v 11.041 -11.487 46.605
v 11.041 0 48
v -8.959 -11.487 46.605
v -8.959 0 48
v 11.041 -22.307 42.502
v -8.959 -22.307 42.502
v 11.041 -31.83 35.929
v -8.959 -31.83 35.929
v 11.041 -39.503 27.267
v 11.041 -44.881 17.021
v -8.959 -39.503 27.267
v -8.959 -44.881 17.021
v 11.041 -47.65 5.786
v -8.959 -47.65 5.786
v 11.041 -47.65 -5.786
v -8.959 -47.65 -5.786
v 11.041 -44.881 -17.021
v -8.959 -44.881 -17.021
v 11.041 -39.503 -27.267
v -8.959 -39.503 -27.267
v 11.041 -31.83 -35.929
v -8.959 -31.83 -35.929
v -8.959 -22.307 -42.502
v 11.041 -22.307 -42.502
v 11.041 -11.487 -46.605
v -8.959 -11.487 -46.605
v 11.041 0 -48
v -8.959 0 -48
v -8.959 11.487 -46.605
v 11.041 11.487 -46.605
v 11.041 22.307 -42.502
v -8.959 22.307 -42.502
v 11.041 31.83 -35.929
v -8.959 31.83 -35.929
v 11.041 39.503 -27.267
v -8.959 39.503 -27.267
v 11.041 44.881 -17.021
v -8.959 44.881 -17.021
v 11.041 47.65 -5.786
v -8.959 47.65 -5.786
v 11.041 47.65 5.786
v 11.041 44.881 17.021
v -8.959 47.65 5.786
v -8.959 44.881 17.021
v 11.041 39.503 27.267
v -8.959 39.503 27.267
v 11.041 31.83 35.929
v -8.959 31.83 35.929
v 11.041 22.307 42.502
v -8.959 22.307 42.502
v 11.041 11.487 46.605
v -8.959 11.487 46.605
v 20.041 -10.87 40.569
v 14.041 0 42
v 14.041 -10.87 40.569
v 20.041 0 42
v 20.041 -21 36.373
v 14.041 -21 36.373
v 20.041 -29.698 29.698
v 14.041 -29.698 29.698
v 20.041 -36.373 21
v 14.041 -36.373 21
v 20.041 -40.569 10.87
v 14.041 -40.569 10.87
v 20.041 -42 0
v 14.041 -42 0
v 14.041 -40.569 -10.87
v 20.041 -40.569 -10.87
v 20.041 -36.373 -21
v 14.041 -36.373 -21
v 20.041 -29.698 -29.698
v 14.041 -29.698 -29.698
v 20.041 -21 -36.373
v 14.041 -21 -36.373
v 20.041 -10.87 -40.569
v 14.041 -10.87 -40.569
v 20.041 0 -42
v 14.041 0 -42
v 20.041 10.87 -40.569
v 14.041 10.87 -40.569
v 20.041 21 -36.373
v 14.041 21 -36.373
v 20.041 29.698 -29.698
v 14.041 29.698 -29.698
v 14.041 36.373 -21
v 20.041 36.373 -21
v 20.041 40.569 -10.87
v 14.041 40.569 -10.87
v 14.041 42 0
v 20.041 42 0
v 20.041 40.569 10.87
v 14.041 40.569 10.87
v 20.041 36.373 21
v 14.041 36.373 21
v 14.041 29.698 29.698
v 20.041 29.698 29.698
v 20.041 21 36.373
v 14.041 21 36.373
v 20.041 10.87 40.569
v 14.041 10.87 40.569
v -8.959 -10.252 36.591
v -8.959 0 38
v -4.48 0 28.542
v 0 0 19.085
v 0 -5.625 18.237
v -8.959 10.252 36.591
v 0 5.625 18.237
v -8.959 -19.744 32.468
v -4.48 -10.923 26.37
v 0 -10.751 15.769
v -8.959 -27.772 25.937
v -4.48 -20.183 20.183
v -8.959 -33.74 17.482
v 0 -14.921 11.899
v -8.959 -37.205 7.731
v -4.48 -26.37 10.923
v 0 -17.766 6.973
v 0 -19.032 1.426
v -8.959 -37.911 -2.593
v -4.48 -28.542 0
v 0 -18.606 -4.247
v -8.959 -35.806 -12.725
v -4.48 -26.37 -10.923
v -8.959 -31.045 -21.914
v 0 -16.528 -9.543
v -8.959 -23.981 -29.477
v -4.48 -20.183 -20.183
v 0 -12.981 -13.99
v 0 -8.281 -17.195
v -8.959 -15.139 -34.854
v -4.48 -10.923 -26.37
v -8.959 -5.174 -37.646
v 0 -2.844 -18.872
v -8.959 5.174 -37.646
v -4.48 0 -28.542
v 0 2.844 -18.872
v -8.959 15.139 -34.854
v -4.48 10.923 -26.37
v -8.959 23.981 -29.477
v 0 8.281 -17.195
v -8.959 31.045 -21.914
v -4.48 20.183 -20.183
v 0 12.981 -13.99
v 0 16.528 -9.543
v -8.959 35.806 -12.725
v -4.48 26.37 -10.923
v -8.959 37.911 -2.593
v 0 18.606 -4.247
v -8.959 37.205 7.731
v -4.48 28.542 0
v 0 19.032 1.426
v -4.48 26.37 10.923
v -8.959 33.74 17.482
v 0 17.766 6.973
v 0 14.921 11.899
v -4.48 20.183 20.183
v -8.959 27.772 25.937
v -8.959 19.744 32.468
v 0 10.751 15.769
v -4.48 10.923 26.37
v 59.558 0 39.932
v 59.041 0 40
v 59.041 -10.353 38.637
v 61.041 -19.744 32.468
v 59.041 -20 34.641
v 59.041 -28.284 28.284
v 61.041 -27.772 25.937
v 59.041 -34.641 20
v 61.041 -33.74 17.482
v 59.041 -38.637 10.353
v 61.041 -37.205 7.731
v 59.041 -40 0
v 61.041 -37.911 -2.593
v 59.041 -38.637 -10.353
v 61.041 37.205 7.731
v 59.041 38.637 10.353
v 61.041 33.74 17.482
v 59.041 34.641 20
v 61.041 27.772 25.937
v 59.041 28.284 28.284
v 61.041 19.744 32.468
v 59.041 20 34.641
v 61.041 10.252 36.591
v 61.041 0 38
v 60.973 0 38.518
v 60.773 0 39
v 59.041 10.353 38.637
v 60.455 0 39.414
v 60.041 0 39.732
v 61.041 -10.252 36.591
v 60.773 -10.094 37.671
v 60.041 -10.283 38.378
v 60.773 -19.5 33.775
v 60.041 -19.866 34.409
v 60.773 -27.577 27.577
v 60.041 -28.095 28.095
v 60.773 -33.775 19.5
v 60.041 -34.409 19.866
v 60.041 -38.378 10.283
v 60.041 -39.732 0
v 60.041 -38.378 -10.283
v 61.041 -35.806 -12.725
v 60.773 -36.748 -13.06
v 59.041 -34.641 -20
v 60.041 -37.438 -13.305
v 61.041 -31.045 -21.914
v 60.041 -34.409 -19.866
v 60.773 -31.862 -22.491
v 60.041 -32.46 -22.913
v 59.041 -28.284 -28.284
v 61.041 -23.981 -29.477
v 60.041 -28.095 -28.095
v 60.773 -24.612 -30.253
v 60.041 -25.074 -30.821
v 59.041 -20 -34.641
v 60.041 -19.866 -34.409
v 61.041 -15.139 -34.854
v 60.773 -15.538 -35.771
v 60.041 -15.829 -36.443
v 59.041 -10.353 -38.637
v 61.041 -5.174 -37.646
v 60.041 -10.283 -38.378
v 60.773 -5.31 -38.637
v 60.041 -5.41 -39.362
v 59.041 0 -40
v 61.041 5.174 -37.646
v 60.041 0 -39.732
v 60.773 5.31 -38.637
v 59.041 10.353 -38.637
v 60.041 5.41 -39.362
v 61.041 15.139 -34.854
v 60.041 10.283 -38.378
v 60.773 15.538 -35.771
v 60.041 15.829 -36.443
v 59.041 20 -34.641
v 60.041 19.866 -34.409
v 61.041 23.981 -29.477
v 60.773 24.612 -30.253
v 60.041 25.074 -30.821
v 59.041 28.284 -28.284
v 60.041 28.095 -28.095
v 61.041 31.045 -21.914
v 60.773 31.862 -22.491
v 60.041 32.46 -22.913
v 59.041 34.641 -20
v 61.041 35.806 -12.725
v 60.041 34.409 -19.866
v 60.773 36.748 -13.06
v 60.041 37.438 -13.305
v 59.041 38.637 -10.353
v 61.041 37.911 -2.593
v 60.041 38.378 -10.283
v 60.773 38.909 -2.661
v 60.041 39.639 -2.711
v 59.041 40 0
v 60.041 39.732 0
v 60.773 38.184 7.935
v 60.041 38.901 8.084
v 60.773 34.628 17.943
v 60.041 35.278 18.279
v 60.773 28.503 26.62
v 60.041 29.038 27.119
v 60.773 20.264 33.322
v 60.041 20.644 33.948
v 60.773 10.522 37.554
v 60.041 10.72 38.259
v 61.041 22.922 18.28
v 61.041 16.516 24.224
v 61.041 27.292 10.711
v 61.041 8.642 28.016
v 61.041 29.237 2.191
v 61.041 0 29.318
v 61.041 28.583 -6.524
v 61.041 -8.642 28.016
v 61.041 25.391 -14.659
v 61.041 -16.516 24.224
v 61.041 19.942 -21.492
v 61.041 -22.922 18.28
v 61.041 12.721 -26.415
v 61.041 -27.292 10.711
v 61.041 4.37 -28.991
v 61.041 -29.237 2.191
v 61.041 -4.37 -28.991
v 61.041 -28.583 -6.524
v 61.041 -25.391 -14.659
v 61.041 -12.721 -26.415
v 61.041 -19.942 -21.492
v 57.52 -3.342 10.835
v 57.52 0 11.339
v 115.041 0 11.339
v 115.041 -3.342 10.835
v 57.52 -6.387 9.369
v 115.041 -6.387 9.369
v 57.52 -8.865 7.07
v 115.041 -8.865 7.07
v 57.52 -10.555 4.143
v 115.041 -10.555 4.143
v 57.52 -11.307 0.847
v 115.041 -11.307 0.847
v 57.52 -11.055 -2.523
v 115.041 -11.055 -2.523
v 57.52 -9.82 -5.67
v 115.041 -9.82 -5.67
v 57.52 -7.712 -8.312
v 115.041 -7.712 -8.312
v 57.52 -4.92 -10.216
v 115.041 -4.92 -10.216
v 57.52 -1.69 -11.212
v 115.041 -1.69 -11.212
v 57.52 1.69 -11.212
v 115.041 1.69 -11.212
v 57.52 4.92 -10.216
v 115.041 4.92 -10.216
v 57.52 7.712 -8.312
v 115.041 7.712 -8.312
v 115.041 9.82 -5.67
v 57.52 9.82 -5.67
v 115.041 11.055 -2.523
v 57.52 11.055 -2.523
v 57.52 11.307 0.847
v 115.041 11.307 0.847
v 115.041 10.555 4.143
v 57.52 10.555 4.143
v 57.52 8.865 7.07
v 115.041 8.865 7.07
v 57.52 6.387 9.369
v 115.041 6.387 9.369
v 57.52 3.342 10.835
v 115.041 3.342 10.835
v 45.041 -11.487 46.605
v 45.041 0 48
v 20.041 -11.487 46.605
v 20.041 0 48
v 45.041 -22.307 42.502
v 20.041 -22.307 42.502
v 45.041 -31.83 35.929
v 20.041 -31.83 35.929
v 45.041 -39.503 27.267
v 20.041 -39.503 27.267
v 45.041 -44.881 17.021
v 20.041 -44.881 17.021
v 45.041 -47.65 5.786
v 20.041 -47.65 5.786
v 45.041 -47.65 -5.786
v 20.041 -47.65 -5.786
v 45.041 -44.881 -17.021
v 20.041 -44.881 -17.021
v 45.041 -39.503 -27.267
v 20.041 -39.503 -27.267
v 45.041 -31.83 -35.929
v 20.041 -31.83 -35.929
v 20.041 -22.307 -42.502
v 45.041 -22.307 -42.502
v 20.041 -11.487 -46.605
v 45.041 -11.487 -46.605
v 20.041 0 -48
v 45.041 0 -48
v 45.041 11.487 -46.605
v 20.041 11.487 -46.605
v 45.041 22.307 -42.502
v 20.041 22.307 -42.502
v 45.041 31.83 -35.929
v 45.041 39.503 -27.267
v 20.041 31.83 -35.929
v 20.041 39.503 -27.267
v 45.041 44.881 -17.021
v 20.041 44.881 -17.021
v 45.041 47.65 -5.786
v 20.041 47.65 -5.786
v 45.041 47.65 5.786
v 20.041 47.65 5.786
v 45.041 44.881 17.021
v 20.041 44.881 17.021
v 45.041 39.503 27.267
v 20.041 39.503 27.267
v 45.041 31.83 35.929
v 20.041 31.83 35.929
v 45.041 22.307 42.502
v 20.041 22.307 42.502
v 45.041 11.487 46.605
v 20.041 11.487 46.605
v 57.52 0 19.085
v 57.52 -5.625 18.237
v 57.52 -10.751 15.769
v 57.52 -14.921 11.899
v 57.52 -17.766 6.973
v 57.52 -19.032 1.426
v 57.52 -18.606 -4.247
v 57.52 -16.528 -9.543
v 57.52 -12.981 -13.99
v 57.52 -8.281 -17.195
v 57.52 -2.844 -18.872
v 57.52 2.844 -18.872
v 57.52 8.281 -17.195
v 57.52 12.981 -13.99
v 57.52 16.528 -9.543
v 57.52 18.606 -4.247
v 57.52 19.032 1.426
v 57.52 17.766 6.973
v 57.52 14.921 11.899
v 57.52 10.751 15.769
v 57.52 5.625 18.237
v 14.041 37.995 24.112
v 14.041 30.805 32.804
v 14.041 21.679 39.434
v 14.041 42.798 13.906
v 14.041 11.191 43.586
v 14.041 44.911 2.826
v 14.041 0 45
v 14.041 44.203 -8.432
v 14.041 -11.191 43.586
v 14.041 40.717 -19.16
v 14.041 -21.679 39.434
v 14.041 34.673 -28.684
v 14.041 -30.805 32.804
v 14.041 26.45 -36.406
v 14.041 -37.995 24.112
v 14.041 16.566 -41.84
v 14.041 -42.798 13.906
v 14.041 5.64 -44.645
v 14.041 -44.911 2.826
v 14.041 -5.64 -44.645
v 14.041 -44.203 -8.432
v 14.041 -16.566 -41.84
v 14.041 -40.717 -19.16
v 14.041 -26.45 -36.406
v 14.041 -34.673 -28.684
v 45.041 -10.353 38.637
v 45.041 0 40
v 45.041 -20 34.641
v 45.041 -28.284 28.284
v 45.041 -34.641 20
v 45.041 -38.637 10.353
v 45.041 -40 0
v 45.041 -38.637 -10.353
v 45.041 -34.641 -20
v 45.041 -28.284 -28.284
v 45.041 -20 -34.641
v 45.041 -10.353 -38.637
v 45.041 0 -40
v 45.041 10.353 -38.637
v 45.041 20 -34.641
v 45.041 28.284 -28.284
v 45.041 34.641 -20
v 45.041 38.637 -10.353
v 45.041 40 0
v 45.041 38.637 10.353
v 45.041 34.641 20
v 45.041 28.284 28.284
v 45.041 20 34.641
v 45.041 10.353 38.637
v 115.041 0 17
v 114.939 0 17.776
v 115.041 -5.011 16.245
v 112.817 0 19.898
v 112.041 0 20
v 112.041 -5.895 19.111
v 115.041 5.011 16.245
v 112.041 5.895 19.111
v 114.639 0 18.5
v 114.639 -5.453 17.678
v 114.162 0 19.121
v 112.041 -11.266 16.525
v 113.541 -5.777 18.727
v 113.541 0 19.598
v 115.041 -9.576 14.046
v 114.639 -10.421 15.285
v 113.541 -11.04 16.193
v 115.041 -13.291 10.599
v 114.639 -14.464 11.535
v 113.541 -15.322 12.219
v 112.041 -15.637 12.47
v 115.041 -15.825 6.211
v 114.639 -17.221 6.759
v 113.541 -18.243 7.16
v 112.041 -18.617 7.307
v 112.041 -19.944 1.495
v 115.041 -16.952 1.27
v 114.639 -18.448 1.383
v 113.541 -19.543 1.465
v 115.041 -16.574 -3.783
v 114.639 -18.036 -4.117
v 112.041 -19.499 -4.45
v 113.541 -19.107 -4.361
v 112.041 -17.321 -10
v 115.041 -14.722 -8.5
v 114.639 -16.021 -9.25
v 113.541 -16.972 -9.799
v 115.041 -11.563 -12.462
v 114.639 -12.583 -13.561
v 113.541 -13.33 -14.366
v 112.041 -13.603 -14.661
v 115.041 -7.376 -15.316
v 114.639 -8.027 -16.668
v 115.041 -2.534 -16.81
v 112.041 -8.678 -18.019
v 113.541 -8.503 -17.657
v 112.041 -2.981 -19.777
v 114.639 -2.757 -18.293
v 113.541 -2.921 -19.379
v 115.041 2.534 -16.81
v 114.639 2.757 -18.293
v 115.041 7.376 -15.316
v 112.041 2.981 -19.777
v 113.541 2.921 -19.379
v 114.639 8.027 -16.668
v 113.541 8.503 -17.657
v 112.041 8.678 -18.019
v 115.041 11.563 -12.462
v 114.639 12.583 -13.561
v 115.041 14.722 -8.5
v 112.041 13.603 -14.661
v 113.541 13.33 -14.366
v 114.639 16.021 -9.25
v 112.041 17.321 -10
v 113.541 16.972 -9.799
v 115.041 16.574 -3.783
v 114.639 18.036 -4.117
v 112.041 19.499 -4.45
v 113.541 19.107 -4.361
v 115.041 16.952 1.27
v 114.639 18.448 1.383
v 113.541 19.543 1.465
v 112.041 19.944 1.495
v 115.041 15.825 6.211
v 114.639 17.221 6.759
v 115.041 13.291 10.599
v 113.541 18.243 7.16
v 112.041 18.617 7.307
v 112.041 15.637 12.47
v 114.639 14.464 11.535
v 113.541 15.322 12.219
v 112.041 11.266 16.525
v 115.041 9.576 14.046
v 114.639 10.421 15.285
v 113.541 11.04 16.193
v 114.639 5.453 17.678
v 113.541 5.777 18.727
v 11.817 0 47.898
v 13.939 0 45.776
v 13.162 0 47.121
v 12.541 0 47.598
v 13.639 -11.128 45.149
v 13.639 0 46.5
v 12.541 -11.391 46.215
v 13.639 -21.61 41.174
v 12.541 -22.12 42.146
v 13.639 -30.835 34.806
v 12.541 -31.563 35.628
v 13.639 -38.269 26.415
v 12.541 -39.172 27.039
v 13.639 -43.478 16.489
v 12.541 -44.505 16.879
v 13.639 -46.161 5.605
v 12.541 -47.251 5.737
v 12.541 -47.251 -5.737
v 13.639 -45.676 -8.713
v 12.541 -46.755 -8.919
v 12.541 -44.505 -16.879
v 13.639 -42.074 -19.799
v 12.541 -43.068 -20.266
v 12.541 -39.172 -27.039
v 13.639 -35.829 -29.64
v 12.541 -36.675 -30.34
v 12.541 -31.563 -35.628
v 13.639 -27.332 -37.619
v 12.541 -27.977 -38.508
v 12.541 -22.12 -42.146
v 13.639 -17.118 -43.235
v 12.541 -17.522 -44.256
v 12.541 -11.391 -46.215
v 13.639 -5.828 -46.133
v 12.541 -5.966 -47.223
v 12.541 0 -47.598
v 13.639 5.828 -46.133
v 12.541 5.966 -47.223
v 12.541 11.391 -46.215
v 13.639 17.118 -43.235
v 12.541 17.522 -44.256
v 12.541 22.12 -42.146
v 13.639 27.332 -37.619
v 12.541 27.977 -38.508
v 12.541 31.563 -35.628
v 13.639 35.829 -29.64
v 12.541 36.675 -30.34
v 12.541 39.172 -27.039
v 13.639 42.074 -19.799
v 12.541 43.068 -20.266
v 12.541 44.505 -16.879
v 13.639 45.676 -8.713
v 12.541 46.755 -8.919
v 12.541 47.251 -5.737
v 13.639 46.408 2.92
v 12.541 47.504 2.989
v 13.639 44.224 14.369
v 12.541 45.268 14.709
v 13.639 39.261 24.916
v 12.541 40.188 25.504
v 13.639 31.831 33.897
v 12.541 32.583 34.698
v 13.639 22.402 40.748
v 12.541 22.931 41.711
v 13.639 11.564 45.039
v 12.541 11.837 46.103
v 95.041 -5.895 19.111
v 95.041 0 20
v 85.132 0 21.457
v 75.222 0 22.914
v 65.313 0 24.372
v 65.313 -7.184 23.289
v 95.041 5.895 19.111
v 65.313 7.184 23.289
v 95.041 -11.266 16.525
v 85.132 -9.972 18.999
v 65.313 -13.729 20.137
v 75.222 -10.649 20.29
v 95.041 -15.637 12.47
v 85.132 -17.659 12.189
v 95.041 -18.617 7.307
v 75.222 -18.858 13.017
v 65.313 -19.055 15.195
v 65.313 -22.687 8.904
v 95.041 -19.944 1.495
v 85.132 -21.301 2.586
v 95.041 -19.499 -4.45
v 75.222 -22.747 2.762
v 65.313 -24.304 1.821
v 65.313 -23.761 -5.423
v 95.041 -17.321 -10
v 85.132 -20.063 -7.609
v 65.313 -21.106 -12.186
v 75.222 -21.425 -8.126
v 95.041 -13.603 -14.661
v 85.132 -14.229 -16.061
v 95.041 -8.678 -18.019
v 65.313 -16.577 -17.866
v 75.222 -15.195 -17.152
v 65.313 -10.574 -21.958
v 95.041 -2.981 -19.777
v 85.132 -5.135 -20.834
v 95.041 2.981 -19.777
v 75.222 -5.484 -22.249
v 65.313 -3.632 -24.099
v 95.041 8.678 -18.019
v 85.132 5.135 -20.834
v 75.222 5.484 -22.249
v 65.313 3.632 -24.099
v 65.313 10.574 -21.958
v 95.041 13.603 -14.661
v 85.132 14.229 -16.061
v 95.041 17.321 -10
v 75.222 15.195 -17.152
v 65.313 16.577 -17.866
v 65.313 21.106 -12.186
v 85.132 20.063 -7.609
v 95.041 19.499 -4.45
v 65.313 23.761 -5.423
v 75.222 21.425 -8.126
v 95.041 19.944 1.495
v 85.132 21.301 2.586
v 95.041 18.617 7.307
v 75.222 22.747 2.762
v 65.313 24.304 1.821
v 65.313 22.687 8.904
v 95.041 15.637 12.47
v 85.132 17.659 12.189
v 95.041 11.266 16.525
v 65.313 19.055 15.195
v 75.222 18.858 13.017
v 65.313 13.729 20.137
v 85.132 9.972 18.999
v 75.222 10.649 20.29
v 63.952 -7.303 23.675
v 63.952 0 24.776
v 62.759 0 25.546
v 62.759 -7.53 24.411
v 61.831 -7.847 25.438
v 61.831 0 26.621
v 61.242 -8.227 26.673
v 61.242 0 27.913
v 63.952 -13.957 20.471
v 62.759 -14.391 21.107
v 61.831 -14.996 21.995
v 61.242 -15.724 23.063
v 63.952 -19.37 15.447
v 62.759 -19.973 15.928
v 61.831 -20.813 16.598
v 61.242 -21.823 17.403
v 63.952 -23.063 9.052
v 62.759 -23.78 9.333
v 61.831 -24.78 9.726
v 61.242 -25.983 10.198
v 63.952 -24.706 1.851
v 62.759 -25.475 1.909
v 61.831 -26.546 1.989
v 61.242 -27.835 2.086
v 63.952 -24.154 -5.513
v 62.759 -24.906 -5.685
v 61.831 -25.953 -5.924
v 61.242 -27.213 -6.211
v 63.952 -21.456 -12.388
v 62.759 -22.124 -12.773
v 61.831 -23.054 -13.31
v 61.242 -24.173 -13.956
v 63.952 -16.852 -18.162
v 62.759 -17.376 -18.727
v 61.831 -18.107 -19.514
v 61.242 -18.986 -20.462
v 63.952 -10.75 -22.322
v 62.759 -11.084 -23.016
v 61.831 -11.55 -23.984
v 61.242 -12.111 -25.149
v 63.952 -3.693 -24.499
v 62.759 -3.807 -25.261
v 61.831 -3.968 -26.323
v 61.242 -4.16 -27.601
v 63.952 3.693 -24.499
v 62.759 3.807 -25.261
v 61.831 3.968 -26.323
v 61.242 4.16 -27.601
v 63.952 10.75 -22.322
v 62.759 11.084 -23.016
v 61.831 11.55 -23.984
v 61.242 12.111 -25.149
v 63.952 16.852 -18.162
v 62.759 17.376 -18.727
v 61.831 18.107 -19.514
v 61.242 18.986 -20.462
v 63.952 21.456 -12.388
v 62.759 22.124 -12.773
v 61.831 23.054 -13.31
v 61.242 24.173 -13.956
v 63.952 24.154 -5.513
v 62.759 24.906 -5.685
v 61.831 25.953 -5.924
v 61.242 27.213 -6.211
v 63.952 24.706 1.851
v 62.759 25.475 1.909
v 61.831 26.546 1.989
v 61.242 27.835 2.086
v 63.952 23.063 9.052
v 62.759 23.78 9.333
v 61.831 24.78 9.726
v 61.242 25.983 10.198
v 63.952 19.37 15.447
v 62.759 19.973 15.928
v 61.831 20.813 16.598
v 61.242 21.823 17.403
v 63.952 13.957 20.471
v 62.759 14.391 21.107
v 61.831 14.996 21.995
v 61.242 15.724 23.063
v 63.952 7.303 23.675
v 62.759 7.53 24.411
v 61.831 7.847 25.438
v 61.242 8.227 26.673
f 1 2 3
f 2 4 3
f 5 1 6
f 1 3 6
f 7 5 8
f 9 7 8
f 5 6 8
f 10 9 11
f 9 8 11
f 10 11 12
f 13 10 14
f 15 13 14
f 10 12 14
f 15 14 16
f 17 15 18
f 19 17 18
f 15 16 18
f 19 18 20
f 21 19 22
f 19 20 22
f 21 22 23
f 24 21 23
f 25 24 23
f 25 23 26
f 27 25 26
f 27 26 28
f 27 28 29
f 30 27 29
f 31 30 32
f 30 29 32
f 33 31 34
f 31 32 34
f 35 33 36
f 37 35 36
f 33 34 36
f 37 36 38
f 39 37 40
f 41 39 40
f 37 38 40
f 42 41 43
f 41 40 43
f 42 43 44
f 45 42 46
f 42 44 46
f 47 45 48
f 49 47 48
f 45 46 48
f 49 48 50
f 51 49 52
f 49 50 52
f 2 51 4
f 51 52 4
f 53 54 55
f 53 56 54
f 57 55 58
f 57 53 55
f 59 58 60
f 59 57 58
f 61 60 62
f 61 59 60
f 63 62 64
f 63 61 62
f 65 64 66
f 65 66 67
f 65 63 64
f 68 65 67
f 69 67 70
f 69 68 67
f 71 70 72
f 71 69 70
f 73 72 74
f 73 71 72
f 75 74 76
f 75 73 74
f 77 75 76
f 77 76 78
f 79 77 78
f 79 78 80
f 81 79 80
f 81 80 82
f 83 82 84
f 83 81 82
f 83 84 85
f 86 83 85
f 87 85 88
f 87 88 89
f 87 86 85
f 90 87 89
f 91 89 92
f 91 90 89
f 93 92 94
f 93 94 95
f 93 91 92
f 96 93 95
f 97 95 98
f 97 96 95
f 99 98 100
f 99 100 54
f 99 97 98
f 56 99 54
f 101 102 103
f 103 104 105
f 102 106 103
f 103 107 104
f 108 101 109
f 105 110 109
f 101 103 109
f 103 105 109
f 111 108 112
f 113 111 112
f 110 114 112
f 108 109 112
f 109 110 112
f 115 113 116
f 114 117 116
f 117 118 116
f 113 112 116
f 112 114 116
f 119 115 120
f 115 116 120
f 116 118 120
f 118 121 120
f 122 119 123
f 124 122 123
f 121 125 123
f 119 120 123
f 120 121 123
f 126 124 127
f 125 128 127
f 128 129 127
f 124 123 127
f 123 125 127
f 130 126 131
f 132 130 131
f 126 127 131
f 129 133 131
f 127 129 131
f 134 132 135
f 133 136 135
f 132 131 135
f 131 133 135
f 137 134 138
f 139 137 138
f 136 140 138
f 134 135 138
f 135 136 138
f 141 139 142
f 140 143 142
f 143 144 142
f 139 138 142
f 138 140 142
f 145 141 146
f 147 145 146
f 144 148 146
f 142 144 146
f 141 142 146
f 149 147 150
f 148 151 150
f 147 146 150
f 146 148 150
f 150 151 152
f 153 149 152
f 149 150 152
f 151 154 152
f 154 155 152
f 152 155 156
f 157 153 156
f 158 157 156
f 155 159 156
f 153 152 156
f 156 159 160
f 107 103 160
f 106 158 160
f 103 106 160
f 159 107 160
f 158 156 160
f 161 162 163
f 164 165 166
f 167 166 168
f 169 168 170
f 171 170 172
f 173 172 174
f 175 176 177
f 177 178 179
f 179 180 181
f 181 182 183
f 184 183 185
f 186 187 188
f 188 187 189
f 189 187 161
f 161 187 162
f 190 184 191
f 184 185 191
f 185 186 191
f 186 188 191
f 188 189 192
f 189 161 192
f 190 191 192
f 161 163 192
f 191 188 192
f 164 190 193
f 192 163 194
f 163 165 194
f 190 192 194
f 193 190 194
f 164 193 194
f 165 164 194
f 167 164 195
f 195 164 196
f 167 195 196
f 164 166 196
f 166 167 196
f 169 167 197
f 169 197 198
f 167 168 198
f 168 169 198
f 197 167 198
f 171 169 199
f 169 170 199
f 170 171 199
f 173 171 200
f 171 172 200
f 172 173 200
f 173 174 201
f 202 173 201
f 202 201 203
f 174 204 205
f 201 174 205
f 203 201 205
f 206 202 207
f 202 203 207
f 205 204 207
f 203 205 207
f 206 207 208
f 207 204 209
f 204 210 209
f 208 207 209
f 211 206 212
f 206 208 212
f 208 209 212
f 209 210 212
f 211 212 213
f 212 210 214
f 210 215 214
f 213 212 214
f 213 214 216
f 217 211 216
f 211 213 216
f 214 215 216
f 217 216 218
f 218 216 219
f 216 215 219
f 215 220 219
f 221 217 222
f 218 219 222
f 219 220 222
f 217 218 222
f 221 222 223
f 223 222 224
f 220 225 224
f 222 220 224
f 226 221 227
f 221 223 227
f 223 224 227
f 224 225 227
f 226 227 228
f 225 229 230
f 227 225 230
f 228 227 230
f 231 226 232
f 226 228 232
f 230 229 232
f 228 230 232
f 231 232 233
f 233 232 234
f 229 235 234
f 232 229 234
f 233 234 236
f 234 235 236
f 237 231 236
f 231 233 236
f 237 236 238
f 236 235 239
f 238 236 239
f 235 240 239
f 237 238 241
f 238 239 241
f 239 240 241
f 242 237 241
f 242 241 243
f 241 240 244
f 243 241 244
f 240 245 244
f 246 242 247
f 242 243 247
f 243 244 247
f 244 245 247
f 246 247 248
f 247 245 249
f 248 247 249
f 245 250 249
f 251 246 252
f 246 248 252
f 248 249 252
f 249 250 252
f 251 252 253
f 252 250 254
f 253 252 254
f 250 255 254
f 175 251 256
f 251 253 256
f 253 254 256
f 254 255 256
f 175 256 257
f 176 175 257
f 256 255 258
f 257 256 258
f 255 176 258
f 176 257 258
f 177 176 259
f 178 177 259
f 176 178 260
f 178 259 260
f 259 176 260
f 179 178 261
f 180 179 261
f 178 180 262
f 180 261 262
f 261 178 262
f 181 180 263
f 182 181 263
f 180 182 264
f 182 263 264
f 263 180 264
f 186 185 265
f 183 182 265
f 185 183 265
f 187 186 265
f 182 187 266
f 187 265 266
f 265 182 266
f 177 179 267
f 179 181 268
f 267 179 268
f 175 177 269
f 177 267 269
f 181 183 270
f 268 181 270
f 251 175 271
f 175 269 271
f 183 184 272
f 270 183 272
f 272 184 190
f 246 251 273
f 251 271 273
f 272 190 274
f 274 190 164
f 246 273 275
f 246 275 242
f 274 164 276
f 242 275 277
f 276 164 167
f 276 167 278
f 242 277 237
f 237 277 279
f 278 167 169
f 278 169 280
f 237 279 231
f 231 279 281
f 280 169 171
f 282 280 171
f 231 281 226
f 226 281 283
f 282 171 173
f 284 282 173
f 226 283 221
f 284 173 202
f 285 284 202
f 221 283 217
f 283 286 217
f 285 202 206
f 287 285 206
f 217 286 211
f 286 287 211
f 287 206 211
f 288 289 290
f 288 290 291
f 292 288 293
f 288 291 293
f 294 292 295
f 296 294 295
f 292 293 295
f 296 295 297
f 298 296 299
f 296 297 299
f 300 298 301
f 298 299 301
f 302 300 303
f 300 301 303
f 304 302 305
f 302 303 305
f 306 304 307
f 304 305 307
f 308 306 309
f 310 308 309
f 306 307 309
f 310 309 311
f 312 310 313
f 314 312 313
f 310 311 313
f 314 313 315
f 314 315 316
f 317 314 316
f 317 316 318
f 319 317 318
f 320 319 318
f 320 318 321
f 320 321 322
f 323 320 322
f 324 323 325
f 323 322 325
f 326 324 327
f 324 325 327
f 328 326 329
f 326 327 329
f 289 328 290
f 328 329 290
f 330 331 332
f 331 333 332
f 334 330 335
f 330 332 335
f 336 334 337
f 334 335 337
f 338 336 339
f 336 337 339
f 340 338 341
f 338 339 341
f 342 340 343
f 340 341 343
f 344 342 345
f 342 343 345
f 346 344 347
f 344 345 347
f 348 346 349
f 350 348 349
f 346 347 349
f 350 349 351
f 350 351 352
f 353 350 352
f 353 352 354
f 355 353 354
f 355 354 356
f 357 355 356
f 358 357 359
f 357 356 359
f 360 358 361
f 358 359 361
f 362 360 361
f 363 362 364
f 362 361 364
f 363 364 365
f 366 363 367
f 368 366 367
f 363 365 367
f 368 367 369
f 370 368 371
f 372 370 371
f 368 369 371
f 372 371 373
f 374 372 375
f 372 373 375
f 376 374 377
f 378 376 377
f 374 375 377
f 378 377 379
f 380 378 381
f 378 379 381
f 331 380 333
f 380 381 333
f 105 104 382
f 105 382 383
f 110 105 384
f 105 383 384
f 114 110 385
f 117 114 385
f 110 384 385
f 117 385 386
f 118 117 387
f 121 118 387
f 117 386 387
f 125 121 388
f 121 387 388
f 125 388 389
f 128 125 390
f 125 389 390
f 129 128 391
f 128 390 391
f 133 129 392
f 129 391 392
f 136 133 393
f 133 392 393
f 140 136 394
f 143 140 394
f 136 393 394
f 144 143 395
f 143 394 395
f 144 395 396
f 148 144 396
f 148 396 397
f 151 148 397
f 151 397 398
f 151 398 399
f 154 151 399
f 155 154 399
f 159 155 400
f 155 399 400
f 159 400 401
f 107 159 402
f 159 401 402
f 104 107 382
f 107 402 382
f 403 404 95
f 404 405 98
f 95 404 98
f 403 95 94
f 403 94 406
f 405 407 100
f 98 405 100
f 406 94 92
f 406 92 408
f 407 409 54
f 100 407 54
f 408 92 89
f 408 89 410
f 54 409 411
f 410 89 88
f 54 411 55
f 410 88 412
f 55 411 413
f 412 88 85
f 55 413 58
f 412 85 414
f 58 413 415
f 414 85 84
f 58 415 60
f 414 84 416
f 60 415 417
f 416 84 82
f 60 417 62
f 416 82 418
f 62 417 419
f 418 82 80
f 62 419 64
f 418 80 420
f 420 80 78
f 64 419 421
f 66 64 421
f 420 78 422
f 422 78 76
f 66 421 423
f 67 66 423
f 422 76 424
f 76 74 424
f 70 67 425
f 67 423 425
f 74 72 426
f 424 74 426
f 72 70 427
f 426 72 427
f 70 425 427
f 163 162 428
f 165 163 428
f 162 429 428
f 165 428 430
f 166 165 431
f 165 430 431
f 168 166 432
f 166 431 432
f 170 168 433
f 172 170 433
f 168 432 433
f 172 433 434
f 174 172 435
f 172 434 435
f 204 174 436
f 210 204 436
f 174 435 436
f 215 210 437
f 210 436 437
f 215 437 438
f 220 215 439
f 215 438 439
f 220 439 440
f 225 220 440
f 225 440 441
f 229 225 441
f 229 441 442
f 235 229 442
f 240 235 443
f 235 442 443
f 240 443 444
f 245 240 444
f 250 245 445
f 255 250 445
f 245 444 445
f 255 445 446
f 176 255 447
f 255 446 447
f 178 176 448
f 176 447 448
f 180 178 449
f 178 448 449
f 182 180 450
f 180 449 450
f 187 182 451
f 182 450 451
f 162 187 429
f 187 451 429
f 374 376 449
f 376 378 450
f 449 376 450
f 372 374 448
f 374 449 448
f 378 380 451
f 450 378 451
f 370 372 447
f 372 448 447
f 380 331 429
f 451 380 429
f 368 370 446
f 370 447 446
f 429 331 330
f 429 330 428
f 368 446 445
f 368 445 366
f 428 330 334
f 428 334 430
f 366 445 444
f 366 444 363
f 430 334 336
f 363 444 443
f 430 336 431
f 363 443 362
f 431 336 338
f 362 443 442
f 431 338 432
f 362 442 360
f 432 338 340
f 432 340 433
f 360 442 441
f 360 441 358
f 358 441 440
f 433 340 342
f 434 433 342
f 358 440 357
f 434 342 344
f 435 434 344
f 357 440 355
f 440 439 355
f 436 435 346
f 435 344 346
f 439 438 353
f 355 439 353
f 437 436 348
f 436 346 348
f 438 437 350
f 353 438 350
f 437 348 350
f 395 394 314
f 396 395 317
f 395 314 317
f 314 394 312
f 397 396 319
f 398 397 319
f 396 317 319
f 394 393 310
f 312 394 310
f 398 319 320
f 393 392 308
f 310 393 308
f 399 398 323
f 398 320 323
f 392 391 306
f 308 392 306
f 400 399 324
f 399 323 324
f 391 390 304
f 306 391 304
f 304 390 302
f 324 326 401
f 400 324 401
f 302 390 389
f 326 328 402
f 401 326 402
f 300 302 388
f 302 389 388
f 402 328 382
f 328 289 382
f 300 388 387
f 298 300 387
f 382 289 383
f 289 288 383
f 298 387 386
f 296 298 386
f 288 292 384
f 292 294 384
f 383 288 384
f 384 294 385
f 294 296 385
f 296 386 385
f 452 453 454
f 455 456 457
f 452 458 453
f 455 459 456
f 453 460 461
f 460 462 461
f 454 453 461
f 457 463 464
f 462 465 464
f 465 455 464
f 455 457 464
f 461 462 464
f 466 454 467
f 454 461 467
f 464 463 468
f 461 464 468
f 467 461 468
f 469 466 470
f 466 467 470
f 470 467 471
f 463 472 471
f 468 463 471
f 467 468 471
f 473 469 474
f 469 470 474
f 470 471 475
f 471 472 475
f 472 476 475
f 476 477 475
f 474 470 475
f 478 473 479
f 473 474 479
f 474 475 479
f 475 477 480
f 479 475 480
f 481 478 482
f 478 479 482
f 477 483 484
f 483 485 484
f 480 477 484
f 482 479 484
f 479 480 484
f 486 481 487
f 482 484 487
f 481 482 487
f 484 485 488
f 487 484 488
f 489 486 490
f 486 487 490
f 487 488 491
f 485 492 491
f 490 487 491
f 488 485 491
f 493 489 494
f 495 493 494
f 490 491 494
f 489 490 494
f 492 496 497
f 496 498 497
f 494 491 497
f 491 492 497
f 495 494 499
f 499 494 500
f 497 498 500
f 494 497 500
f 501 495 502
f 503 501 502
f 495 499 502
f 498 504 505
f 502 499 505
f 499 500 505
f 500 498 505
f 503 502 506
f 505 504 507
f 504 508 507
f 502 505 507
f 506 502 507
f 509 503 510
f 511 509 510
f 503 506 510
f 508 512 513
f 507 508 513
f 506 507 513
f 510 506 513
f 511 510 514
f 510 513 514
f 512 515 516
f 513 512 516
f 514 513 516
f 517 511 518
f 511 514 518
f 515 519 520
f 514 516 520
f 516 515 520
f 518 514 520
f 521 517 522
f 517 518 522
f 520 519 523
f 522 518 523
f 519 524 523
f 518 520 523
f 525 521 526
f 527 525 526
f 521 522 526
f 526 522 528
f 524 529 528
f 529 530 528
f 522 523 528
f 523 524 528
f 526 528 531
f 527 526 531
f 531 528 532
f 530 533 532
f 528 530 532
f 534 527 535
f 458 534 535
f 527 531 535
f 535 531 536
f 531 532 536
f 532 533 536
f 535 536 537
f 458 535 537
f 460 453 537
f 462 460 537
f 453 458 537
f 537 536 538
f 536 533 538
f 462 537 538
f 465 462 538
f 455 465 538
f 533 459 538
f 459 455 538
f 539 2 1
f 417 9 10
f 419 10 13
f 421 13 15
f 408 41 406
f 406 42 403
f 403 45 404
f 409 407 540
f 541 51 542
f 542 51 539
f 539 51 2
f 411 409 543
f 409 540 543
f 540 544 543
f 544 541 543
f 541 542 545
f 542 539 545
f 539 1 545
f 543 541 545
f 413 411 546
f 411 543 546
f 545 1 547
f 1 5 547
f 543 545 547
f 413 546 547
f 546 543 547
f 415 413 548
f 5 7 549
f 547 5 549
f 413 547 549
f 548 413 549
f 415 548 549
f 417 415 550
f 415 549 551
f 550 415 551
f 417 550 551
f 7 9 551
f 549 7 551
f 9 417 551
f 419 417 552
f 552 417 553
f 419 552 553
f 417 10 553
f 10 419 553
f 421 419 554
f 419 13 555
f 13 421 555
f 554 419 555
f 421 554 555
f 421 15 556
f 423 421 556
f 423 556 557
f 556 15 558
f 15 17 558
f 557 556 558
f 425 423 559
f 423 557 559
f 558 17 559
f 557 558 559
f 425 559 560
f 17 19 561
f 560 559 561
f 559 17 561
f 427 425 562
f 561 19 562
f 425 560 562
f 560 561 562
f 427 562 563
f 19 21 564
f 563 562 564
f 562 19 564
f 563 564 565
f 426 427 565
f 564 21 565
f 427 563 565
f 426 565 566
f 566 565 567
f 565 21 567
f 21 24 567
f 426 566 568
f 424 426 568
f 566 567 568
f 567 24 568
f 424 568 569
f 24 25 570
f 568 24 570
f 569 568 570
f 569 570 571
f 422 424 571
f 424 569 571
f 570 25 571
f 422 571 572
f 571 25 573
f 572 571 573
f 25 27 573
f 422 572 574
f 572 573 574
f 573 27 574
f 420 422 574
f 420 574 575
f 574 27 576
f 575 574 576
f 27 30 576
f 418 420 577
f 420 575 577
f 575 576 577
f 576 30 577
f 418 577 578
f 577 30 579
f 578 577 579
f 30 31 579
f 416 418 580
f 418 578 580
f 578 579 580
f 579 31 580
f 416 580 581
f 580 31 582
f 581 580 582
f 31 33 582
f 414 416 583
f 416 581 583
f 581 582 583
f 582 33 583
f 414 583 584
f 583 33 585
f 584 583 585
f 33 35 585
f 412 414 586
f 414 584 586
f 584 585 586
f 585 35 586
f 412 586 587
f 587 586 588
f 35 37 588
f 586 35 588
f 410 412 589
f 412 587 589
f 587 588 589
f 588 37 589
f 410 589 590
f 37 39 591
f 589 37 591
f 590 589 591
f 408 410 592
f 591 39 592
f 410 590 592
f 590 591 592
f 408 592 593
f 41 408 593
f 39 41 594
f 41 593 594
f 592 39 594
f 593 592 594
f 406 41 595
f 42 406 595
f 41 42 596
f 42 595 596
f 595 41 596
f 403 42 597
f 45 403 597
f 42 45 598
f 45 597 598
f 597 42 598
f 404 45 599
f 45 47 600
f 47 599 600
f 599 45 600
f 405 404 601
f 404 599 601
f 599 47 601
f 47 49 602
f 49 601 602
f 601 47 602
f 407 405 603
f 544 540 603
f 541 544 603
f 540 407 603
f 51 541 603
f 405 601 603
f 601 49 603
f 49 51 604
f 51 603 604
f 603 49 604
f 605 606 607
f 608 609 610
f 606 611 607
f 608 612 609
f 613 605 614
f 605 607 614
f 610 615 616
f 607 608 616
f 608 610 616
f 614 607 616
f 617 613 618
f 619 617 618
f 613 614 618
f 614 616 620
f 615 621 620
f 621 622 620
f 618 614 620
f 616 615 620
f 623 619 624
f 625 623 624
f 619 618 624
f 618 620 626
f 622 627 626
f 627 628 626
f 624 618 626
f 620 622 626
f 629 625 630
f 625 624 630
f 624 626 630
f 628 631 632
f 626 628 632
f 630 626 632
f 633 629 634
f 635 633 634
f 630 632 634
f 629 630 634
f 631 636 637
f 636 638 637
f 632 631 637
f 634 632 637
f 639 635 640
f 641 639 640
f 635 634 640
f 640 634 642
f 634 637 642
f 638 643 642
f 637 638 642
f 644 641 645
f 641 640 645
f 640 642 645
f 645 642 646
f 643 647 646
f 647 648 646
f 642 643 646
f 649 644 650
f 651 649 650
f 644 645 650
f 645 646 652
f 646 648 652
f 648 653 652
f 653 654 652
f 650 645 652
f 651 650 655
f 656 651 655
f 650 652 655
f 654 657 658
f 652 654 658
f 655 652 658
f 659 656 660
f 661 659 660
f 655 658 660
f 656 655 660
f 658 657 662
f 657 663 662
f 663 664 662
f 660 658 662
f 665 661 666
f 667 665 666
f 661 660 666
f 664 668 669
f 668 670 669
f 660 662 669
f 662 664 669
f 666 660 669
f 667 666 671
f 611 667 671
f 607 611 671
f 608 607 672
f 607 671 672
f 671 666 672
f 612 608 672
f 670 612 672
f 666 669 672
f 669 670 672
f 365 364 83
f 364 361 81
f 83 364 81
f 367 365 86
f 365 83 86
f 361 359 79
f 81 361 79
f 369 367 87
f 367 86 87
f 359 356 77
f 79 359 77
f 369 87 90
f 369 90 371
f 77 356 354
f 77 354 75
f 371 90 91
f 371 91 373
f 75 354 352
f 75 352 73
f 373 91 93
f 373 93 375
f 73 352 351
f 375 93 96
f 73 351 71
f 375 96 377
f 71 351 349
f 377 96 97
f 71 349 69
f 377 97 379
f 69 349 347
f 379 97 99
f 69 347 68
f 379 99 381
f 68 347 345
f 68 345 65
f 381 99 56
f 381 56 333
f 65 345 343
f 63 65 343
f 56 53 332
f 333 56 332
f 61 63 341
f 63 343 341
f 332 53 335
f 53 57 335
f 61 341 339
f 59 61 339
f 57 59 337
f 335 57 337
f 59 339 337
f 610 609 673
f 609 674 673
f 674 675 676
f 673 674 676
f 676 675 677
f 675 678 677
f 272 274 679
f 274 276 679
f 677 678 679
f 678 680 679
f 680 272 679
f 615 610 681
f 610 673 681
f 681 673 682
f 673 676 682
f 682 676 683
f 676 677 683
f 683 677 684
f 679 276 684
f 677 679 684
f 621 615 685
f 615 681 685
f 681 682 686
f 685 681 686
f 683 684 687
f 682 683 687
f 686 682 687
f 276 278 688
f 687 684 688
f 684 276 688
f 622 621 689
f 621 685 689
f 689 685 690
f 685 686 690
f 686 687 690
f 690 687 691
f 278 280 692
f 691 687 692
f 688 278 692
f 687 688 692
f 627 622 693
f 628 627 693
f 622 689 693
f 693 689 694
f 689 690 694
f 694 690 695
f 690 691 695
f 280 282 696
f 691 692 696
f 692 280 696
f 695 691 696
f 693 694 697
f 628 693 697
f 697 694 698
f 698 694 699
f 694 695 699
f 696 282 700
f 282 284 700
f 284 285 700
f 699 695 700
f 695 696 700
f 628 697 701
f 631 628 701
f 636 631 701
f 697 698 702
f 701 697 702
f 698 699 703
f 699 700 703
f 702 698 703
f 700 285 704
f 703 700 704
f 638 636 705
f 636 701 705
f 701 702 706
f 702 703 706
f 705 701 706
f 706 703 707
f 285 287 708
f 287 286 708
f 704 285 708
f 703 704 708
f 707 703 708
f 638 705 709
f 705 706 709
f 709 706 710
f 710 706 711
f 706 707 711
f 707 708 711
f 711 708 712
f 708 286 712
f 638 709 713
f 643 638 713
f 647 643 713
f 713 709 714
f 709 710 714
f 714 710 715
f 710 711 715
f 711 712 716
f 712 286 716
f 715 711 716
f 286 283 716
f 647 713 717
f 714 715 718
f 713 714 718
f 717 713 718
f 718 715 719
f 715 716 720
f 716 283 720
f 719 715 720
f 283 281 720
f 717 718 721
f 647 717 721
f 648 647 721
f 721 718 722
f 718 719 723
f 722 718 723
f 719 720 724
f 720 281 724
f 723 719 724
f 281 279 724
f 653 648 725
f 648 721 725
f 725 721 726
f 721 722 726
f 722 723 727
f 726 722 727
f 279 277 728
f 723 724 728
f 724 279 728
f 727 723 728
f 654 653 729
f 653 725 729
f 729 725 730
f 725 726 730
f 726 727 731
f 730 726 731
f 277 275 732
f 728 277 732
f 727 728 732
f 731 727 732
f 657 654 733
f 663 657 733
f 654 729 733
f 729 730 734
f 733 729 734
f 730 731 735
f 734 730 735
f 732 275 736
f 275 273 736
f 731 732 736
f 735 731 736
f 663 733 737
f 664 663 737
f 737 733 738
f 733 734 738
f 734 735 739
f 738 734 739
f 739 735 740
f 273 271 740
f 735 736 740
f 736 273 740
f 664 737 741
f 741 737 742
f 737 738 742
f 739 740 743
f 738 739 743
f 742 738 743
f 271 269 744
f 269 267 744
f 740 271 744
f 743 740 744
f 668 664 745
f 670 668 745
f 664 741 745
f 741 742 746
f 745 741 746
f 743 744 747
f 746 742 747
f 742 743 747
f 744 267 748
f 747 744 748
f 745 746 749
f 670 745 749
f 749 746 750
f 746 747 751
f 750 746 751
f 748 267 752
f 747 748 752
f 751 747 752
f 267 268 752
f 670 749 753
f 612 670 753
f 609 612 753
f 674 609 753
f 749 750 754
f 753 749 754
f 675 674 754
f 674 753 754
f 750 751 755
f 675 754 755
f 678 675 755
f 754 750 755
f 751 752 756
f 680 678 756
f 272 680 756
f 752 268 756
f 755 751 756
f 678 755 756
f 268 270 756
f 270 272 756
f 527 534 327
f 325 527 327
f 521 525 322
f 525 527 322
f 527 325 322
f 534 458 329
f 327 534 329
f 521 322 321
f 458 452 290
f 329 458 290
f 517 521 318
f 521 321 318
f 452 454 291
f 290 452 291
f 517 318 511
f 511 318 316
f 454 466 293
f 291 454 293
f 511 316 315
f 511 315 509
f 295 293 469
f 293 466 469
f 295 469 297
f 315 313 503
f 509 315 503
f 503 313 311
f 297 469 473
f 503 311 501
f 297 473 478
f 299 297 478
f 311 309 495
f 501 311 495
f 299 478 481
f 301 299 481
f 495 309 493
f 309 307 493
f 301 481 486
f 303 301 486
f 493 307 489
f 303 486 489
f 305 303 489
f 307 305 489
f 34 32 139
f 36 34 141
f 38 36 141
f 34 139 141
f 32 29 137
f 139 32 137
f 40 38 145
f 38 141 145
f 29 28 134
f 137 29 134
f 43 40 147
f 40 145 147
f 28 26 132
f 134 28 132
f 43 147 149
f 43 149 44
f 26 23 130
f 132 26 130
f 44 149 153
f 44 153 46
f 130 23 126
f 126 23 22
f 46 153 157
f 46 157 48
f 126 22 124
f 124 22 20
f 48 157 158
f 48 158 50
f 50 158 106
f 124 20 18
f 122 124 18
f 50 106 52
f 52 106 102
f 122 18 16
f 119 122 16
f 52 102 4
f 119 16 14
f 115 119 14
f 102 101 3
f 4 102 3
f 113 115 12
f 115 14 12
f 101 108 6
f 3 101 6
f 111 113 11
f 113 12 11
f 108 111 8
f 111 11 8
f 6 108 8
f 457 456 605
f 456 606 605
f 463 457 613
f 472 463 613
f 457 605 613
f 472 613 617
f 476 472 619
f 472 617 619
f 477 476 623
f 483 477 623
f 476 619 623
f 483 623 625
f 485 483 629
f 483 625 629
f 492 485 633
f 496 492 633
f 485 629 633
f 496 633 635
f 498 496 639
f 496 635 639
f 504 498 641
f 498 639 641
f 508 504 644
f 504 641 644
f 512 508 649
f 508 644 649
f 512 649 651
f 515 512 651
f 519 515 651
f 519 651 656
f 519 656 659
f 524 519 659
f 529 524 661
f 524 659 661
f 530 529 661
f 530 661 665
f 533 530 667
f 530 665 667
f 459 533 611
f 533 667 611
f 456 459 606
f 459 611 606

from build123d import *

# Parameters (mm, degrees)
SKETCH1_W = 6
SKETCH1_H = 22.915


with BuildPart() as part:
    # Sketch1 → Revolve1 (revolve)
    with BuildSketch(Plane.XY, mode=Mode.PRIVATE) as revolve1_sk:
        with BuildLine():
            Line((-8.959217604, 38), (0, 19.085))
            Line((0, 19.085), (14.040782396, 19.085))
            Line((14.040782396, 19.085), (14.040782396, 42))
            Line((14.040782396, 42), (14.040782396, 45))
            ThreePointArc((14.040782396, 45), (13.16210274, 47.121320344), (11.040782396, 48))
            Line((11.040782396, 48), (-8.959217604, 48))
            Line((-8.959217604, 48), (-8.959217604, 38))
        make_face()
        with Locations((17.040782396, 30.5425)):
            Rectangle(SKETCH1_W, SKETCH1_H)
        Polygon((20.040782396, 42), (20.040782396, 19.085), (28.557506112, 19.085), (45.040782396, 19.085), (45.040782396, 40), (45.040782396, 48), (20.040782396, 48), align=None)
        with BuildLine():
            Line((57.520391198, 19.085), (57.520391198, 11.33900978))
            Line((57.520391198, 11.33900978), (95.040782396, 11.33900978))
            Line((95.040782396, 11.33900978), (95.040782396, 20))
            Line((95.040782396, 20), (65.313312444, 24.371686758))
            ThreePointArc((65.313312444, 24.371686758), (62.256779901, 26.050252773), (61.040782396, 29.318482435))
            Line((61.040782396, 29.318482435), (61.040782396, 38))
            ThreePointArc((61.040782396, 38), (60.454995958, 39.414213562), (59.040782396, 40))
            Line((59.040782396, 40), (54.186650367, 40))
            Line((54.186650367, 40), (45.040782396, 40))
            Line((45.040782396, 40), (45.040782396, 19.085))
            Line((45.040782396, 19.085), (57.520391198, 19.085))
        make_face()
        with BuildLine():
            Line((95.040782396, 11.33900978), (115.040782396, 11.33900978))
            Line((115.040782396, 11.33900978), (115.040782396, 17))
            ThreePointArc((115.040782396, 17), (114.16210274, 19.121320344), (112.040782396, 20))
            Line((112.040782396, 20), (95.040782396, 20))
            Line((95.040782396, 20), (95.040782396, 11.33900978))
        make_face()
    revolve(revolve1_sk.sketch.rotate(Axis((0, 0, 0), (1, 0, 0)), 90), axis=Axis((0, 0, 0), (1, 0, 0)))


solid = part.part
